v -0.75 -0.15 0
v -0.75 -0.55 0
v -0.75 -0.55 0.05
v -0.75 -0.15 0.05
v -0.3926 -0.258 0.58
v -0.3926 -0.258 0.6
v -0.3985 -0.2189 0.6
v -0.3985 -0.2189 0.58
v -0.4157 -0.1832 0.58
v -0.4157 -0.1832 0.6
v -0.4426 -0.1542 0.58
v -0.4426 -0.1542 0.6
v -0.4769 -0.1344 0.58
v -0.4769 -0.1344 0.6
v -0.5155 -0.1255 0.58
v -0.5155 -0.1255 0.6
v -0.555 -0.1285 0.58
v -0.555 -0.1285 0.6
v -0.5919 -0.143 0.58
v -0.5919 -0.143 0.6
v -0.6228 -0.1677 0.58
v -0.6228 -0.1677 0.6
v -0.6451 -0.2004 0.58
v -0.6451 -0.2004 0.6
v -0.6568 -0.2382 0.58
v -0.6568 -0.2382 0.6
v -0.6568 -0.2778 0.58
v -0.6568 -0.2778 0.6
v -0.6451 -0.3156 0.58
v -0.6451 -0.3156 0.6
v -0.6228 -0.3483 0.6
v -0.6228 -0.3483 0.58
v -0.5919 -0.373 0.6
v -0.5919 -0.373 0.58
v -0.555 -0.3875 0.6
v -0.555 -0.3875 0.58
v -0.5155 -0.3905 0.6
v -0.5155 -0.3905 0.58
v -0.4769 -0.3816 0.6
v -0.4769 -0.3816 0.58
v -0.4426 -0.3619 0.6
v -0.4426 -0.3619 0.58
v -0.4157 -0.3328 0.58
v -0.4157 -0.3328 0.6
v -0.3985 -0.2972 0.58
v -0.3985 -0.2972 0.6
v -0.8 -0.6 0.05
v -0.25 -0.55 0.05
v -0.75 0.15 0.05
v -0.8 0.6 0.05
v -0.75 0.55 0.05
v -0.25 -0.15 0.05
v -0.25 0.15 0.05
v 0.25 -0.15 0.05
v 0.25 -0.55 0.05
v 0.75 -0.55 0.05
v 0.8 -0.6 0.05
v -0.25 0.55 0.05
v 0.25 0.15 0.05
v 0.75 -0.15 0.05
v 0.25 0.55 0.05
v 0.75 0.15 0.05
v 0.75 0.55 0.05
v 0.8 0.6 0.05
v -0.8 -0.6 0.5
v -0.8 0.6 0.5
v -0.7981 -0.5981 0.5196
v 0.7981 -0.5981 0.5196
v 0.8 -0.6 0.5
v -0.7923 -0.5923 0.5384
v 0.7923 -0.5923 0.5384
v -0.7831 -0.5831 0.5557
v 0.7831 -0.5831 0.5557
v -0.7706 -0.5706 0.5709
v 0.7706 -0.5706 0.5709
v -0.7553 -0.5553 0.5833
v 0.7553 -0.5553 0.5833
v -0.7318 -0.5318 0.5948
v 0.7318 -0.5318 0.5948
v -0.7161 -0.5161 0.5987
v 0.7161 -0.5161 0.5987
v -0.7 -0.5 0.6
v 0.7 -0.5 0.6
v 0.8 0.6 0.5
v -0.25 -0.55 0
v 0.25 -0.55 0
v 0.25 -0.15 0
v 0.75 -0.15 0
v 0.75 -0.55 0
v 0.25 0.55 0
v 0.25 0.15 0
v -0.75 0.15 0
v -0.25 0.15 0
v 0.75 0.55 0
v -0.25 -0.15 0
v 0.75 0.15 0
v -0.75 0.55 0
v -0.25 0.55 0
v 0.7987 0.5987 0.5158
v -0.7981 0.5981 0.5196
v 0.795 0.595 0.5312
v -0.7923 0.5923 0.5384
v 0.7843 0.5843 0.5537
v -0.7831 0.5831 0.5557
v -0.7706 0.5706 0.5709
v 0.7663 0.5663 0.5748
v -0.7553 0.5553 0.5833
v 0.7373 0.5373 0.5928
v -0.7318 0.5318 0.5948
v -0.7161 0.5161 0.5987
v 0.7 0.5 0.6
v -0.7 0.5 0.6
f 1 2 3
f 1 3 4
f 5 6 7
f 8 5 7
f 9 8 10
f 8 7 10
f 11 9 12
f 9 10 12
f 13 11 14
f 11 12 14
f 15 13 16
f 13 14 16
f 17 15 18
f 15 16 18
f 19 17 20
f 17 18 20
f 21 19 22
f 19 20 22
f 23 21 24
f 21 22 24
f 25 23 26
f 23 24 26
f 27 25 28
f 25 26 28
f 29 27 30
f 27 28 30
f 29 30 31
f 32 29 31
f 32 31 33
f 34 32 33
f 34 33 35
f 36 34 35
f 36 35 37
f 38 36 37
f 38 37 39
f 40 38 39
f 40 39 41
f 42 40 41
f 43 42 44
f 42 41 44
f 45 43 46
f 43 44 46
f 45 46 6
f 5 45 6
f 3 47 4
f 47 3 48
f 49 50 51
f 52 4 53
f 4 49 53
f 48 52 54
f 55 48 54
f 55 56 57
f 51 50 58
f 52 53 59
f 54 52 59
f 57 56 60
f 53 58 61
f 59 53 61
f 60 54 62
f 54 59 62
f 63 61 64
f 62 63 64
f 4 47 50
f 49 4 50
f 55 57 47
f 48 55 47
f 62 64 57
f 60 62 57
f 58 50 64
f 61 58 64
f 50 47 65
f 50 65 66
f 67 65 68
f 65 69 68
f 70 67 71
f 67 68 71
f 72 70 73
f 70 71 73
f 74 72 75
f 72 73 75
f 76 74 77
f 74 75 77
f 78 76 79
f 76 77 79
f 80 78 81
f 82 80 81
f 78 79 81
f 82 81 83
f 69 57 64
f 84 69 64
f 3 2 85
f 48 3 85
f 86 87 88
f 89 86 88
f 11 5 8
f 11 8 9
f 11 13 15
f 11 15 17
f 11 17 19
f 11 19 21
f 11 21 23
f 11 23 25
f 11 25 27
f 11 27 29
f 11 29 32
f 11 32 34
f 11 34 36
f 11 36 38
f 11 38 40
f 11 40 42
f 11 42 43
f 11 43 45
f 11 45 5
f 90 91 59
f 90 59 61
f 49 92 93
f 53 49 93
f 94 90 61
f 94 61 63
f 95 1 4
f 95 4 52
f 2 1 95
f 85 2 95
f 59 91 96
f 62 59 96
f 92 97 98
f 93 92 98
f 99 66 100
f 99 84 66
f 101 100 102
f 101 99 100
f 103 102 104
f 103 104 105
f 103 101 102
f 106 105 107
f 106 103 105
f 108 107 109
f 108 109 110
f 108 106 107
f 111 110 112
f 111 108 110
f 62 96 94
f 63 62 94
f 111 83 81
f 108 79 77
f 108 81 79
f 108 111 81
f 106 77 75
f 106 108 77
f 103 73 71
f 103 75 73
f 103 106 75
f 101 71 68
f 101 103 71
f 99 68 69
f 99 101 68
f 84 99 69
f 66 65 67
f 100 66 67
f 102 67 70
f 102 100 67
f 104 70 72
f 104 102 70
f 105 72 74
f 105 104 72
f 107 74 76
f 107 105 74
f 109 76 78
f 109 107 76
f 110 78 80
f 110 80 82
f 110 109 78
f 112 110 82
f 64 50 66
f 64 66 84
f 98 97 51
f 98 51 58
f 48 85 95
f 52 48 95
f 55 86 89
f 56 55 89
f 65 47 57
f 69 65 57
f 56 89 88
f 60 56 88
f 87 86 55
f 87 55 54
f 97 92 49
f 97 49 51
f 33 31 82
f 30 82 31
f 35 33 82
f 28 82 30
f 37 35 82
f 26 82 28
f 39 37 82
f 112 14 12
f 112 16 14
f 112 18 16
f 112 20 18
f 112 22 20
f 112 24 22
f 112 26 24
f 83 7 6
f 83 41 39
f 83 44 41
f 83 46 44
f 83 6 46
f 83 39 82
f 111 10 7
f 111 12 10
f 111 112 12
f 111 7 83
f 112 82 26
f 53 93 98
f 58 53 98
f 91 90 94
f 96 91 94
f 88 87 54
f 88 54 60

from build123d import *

# Parameters (mm, degrees)
BOSS_EXTRUDE1_START = 0.05
SKETCH1_W           = 1.6
SKETCH1_H           = 1.2
BOSS_EXTRUDE1_DEPTH = 0.55
BOSS_EXTRUDE2_REACH = 2.6
SKETCH2_W           = 0.5
SKETCH2_H           = 0.4
FILLET1_R           = 0.1
SKETCH3_R           = 0.132827507
CUT_EXTRUDE1_DEPTH  = 0.02


with BuildPart() as part:
    # Sketch1 → Boss-Extrude1 (new body)
    with BuildSketch(Plane.XY.offset(BOSS_EXTRUDE1_START)):
        Rectangle(SKETCH1_W, SKETCH1_H)
    extrude(amount=BOSS_EXTRUDE1_DEPTH)

    # Sketch2 → Boss-Extrude2 (add, up to next)
    with BuildSketch(Plane.XY, mode=Mode.PRIVATE) as boss_extrude2_sk1:
        with Locations((-0.5, 0.35)):
            Rectangle(SKETCH2_W, SKETCH2_H)
    boss_extrude2_tool1 = extrude(boss_extrude2_sk1.sketch, amount=BOSS_EXTRUDE2_REACH, mode=Mode.PRIVATE) - part.part
    add(boss_extrude2_tool1.solids().sort_by_distance((-0.5, 0.35, 0))[0])
    # Sketch2 → Boss-Extrude2 (add, up to next)
    with BuildSketch(Plane.XY, mode=Mode.PRIVATE) as boss_extrude2_sk2:
        with Locations((-0.5, -0.35)):
            Rectangle(SKETCH2_W, SKETCH2_H)
    boss_extrude2_tool2 = extrude(boss_extrude2_sk2.sketch, amount=BOSS_EXTRUDE2_REACH, mode=Mode.PRIVATE) - part.part
    add(boss_extrude2_tool2.solids().sort_by_distance((-0.5, -0.35, 0))[0])
    # Sketch2 → Boss-Extrude2 (add, up to next)
    with BuildSketch(Plane.XY, mode=Mode.PRIVATE) as boss_extrude2_sk3:
        with Locations((0.5, 0.35)):
            Rectangle(SKETCH2_W, SKETCH2_H)
    boss_extrude2_tool3 = extrude(boss_extrude2_sk3.sketch, amount=BOSS_EXTRUDE2_REACH, mode=Mode.PRIVATE) - part.part
    add(boss_extrude2_tool3.solids().sort_by_distance((0.5, 0.35, 0))[0])
    # Sketch2 → Boss-Extrude2 (add, up to next)
    with BuildSketch(Plane.XY, mode=Mode.PRIVATE) as boss_extrude2_sk4:
        with Locations((0.5, -0.35)):
            Rectangle(SKETCH2_W, SKETCH2_H)
    boss_extrude2_tool4 = extrude(boss_extrude2_sk4.sketch, amount=BOSS_EXTRUDE2_REACH, mode=Mode.PRIVATE) - part.part
    add(boss_extrude2_tool4.solids().sort_by_distance((0.5, -0.35, 0))[0])

    # Fillet1
    fillet1_edges = [part.edges().sort_by_distance(p)[0] for p in [
        (-0.8, 0, 0.6),
        (0, -0.6, 0.6),
        (0.8, 0, 0.6),
        (0, 0.6, 0.6),
    ]]
    fillet(fillet1_edges, radius=FILLET1_R)

    # Sketch3 → Cut-Extrude1 (cut)
    with BuildSketch(Plane.XY.offset(0.6)):
        with Locations((-0.525466391, -0.258003209)):
            Circle(SKETCH3_R)
    extrude(amount=-CUT_EXTRUDE1_DEPTH, mode=Mode.SUBTRACT)


solid = part.part
